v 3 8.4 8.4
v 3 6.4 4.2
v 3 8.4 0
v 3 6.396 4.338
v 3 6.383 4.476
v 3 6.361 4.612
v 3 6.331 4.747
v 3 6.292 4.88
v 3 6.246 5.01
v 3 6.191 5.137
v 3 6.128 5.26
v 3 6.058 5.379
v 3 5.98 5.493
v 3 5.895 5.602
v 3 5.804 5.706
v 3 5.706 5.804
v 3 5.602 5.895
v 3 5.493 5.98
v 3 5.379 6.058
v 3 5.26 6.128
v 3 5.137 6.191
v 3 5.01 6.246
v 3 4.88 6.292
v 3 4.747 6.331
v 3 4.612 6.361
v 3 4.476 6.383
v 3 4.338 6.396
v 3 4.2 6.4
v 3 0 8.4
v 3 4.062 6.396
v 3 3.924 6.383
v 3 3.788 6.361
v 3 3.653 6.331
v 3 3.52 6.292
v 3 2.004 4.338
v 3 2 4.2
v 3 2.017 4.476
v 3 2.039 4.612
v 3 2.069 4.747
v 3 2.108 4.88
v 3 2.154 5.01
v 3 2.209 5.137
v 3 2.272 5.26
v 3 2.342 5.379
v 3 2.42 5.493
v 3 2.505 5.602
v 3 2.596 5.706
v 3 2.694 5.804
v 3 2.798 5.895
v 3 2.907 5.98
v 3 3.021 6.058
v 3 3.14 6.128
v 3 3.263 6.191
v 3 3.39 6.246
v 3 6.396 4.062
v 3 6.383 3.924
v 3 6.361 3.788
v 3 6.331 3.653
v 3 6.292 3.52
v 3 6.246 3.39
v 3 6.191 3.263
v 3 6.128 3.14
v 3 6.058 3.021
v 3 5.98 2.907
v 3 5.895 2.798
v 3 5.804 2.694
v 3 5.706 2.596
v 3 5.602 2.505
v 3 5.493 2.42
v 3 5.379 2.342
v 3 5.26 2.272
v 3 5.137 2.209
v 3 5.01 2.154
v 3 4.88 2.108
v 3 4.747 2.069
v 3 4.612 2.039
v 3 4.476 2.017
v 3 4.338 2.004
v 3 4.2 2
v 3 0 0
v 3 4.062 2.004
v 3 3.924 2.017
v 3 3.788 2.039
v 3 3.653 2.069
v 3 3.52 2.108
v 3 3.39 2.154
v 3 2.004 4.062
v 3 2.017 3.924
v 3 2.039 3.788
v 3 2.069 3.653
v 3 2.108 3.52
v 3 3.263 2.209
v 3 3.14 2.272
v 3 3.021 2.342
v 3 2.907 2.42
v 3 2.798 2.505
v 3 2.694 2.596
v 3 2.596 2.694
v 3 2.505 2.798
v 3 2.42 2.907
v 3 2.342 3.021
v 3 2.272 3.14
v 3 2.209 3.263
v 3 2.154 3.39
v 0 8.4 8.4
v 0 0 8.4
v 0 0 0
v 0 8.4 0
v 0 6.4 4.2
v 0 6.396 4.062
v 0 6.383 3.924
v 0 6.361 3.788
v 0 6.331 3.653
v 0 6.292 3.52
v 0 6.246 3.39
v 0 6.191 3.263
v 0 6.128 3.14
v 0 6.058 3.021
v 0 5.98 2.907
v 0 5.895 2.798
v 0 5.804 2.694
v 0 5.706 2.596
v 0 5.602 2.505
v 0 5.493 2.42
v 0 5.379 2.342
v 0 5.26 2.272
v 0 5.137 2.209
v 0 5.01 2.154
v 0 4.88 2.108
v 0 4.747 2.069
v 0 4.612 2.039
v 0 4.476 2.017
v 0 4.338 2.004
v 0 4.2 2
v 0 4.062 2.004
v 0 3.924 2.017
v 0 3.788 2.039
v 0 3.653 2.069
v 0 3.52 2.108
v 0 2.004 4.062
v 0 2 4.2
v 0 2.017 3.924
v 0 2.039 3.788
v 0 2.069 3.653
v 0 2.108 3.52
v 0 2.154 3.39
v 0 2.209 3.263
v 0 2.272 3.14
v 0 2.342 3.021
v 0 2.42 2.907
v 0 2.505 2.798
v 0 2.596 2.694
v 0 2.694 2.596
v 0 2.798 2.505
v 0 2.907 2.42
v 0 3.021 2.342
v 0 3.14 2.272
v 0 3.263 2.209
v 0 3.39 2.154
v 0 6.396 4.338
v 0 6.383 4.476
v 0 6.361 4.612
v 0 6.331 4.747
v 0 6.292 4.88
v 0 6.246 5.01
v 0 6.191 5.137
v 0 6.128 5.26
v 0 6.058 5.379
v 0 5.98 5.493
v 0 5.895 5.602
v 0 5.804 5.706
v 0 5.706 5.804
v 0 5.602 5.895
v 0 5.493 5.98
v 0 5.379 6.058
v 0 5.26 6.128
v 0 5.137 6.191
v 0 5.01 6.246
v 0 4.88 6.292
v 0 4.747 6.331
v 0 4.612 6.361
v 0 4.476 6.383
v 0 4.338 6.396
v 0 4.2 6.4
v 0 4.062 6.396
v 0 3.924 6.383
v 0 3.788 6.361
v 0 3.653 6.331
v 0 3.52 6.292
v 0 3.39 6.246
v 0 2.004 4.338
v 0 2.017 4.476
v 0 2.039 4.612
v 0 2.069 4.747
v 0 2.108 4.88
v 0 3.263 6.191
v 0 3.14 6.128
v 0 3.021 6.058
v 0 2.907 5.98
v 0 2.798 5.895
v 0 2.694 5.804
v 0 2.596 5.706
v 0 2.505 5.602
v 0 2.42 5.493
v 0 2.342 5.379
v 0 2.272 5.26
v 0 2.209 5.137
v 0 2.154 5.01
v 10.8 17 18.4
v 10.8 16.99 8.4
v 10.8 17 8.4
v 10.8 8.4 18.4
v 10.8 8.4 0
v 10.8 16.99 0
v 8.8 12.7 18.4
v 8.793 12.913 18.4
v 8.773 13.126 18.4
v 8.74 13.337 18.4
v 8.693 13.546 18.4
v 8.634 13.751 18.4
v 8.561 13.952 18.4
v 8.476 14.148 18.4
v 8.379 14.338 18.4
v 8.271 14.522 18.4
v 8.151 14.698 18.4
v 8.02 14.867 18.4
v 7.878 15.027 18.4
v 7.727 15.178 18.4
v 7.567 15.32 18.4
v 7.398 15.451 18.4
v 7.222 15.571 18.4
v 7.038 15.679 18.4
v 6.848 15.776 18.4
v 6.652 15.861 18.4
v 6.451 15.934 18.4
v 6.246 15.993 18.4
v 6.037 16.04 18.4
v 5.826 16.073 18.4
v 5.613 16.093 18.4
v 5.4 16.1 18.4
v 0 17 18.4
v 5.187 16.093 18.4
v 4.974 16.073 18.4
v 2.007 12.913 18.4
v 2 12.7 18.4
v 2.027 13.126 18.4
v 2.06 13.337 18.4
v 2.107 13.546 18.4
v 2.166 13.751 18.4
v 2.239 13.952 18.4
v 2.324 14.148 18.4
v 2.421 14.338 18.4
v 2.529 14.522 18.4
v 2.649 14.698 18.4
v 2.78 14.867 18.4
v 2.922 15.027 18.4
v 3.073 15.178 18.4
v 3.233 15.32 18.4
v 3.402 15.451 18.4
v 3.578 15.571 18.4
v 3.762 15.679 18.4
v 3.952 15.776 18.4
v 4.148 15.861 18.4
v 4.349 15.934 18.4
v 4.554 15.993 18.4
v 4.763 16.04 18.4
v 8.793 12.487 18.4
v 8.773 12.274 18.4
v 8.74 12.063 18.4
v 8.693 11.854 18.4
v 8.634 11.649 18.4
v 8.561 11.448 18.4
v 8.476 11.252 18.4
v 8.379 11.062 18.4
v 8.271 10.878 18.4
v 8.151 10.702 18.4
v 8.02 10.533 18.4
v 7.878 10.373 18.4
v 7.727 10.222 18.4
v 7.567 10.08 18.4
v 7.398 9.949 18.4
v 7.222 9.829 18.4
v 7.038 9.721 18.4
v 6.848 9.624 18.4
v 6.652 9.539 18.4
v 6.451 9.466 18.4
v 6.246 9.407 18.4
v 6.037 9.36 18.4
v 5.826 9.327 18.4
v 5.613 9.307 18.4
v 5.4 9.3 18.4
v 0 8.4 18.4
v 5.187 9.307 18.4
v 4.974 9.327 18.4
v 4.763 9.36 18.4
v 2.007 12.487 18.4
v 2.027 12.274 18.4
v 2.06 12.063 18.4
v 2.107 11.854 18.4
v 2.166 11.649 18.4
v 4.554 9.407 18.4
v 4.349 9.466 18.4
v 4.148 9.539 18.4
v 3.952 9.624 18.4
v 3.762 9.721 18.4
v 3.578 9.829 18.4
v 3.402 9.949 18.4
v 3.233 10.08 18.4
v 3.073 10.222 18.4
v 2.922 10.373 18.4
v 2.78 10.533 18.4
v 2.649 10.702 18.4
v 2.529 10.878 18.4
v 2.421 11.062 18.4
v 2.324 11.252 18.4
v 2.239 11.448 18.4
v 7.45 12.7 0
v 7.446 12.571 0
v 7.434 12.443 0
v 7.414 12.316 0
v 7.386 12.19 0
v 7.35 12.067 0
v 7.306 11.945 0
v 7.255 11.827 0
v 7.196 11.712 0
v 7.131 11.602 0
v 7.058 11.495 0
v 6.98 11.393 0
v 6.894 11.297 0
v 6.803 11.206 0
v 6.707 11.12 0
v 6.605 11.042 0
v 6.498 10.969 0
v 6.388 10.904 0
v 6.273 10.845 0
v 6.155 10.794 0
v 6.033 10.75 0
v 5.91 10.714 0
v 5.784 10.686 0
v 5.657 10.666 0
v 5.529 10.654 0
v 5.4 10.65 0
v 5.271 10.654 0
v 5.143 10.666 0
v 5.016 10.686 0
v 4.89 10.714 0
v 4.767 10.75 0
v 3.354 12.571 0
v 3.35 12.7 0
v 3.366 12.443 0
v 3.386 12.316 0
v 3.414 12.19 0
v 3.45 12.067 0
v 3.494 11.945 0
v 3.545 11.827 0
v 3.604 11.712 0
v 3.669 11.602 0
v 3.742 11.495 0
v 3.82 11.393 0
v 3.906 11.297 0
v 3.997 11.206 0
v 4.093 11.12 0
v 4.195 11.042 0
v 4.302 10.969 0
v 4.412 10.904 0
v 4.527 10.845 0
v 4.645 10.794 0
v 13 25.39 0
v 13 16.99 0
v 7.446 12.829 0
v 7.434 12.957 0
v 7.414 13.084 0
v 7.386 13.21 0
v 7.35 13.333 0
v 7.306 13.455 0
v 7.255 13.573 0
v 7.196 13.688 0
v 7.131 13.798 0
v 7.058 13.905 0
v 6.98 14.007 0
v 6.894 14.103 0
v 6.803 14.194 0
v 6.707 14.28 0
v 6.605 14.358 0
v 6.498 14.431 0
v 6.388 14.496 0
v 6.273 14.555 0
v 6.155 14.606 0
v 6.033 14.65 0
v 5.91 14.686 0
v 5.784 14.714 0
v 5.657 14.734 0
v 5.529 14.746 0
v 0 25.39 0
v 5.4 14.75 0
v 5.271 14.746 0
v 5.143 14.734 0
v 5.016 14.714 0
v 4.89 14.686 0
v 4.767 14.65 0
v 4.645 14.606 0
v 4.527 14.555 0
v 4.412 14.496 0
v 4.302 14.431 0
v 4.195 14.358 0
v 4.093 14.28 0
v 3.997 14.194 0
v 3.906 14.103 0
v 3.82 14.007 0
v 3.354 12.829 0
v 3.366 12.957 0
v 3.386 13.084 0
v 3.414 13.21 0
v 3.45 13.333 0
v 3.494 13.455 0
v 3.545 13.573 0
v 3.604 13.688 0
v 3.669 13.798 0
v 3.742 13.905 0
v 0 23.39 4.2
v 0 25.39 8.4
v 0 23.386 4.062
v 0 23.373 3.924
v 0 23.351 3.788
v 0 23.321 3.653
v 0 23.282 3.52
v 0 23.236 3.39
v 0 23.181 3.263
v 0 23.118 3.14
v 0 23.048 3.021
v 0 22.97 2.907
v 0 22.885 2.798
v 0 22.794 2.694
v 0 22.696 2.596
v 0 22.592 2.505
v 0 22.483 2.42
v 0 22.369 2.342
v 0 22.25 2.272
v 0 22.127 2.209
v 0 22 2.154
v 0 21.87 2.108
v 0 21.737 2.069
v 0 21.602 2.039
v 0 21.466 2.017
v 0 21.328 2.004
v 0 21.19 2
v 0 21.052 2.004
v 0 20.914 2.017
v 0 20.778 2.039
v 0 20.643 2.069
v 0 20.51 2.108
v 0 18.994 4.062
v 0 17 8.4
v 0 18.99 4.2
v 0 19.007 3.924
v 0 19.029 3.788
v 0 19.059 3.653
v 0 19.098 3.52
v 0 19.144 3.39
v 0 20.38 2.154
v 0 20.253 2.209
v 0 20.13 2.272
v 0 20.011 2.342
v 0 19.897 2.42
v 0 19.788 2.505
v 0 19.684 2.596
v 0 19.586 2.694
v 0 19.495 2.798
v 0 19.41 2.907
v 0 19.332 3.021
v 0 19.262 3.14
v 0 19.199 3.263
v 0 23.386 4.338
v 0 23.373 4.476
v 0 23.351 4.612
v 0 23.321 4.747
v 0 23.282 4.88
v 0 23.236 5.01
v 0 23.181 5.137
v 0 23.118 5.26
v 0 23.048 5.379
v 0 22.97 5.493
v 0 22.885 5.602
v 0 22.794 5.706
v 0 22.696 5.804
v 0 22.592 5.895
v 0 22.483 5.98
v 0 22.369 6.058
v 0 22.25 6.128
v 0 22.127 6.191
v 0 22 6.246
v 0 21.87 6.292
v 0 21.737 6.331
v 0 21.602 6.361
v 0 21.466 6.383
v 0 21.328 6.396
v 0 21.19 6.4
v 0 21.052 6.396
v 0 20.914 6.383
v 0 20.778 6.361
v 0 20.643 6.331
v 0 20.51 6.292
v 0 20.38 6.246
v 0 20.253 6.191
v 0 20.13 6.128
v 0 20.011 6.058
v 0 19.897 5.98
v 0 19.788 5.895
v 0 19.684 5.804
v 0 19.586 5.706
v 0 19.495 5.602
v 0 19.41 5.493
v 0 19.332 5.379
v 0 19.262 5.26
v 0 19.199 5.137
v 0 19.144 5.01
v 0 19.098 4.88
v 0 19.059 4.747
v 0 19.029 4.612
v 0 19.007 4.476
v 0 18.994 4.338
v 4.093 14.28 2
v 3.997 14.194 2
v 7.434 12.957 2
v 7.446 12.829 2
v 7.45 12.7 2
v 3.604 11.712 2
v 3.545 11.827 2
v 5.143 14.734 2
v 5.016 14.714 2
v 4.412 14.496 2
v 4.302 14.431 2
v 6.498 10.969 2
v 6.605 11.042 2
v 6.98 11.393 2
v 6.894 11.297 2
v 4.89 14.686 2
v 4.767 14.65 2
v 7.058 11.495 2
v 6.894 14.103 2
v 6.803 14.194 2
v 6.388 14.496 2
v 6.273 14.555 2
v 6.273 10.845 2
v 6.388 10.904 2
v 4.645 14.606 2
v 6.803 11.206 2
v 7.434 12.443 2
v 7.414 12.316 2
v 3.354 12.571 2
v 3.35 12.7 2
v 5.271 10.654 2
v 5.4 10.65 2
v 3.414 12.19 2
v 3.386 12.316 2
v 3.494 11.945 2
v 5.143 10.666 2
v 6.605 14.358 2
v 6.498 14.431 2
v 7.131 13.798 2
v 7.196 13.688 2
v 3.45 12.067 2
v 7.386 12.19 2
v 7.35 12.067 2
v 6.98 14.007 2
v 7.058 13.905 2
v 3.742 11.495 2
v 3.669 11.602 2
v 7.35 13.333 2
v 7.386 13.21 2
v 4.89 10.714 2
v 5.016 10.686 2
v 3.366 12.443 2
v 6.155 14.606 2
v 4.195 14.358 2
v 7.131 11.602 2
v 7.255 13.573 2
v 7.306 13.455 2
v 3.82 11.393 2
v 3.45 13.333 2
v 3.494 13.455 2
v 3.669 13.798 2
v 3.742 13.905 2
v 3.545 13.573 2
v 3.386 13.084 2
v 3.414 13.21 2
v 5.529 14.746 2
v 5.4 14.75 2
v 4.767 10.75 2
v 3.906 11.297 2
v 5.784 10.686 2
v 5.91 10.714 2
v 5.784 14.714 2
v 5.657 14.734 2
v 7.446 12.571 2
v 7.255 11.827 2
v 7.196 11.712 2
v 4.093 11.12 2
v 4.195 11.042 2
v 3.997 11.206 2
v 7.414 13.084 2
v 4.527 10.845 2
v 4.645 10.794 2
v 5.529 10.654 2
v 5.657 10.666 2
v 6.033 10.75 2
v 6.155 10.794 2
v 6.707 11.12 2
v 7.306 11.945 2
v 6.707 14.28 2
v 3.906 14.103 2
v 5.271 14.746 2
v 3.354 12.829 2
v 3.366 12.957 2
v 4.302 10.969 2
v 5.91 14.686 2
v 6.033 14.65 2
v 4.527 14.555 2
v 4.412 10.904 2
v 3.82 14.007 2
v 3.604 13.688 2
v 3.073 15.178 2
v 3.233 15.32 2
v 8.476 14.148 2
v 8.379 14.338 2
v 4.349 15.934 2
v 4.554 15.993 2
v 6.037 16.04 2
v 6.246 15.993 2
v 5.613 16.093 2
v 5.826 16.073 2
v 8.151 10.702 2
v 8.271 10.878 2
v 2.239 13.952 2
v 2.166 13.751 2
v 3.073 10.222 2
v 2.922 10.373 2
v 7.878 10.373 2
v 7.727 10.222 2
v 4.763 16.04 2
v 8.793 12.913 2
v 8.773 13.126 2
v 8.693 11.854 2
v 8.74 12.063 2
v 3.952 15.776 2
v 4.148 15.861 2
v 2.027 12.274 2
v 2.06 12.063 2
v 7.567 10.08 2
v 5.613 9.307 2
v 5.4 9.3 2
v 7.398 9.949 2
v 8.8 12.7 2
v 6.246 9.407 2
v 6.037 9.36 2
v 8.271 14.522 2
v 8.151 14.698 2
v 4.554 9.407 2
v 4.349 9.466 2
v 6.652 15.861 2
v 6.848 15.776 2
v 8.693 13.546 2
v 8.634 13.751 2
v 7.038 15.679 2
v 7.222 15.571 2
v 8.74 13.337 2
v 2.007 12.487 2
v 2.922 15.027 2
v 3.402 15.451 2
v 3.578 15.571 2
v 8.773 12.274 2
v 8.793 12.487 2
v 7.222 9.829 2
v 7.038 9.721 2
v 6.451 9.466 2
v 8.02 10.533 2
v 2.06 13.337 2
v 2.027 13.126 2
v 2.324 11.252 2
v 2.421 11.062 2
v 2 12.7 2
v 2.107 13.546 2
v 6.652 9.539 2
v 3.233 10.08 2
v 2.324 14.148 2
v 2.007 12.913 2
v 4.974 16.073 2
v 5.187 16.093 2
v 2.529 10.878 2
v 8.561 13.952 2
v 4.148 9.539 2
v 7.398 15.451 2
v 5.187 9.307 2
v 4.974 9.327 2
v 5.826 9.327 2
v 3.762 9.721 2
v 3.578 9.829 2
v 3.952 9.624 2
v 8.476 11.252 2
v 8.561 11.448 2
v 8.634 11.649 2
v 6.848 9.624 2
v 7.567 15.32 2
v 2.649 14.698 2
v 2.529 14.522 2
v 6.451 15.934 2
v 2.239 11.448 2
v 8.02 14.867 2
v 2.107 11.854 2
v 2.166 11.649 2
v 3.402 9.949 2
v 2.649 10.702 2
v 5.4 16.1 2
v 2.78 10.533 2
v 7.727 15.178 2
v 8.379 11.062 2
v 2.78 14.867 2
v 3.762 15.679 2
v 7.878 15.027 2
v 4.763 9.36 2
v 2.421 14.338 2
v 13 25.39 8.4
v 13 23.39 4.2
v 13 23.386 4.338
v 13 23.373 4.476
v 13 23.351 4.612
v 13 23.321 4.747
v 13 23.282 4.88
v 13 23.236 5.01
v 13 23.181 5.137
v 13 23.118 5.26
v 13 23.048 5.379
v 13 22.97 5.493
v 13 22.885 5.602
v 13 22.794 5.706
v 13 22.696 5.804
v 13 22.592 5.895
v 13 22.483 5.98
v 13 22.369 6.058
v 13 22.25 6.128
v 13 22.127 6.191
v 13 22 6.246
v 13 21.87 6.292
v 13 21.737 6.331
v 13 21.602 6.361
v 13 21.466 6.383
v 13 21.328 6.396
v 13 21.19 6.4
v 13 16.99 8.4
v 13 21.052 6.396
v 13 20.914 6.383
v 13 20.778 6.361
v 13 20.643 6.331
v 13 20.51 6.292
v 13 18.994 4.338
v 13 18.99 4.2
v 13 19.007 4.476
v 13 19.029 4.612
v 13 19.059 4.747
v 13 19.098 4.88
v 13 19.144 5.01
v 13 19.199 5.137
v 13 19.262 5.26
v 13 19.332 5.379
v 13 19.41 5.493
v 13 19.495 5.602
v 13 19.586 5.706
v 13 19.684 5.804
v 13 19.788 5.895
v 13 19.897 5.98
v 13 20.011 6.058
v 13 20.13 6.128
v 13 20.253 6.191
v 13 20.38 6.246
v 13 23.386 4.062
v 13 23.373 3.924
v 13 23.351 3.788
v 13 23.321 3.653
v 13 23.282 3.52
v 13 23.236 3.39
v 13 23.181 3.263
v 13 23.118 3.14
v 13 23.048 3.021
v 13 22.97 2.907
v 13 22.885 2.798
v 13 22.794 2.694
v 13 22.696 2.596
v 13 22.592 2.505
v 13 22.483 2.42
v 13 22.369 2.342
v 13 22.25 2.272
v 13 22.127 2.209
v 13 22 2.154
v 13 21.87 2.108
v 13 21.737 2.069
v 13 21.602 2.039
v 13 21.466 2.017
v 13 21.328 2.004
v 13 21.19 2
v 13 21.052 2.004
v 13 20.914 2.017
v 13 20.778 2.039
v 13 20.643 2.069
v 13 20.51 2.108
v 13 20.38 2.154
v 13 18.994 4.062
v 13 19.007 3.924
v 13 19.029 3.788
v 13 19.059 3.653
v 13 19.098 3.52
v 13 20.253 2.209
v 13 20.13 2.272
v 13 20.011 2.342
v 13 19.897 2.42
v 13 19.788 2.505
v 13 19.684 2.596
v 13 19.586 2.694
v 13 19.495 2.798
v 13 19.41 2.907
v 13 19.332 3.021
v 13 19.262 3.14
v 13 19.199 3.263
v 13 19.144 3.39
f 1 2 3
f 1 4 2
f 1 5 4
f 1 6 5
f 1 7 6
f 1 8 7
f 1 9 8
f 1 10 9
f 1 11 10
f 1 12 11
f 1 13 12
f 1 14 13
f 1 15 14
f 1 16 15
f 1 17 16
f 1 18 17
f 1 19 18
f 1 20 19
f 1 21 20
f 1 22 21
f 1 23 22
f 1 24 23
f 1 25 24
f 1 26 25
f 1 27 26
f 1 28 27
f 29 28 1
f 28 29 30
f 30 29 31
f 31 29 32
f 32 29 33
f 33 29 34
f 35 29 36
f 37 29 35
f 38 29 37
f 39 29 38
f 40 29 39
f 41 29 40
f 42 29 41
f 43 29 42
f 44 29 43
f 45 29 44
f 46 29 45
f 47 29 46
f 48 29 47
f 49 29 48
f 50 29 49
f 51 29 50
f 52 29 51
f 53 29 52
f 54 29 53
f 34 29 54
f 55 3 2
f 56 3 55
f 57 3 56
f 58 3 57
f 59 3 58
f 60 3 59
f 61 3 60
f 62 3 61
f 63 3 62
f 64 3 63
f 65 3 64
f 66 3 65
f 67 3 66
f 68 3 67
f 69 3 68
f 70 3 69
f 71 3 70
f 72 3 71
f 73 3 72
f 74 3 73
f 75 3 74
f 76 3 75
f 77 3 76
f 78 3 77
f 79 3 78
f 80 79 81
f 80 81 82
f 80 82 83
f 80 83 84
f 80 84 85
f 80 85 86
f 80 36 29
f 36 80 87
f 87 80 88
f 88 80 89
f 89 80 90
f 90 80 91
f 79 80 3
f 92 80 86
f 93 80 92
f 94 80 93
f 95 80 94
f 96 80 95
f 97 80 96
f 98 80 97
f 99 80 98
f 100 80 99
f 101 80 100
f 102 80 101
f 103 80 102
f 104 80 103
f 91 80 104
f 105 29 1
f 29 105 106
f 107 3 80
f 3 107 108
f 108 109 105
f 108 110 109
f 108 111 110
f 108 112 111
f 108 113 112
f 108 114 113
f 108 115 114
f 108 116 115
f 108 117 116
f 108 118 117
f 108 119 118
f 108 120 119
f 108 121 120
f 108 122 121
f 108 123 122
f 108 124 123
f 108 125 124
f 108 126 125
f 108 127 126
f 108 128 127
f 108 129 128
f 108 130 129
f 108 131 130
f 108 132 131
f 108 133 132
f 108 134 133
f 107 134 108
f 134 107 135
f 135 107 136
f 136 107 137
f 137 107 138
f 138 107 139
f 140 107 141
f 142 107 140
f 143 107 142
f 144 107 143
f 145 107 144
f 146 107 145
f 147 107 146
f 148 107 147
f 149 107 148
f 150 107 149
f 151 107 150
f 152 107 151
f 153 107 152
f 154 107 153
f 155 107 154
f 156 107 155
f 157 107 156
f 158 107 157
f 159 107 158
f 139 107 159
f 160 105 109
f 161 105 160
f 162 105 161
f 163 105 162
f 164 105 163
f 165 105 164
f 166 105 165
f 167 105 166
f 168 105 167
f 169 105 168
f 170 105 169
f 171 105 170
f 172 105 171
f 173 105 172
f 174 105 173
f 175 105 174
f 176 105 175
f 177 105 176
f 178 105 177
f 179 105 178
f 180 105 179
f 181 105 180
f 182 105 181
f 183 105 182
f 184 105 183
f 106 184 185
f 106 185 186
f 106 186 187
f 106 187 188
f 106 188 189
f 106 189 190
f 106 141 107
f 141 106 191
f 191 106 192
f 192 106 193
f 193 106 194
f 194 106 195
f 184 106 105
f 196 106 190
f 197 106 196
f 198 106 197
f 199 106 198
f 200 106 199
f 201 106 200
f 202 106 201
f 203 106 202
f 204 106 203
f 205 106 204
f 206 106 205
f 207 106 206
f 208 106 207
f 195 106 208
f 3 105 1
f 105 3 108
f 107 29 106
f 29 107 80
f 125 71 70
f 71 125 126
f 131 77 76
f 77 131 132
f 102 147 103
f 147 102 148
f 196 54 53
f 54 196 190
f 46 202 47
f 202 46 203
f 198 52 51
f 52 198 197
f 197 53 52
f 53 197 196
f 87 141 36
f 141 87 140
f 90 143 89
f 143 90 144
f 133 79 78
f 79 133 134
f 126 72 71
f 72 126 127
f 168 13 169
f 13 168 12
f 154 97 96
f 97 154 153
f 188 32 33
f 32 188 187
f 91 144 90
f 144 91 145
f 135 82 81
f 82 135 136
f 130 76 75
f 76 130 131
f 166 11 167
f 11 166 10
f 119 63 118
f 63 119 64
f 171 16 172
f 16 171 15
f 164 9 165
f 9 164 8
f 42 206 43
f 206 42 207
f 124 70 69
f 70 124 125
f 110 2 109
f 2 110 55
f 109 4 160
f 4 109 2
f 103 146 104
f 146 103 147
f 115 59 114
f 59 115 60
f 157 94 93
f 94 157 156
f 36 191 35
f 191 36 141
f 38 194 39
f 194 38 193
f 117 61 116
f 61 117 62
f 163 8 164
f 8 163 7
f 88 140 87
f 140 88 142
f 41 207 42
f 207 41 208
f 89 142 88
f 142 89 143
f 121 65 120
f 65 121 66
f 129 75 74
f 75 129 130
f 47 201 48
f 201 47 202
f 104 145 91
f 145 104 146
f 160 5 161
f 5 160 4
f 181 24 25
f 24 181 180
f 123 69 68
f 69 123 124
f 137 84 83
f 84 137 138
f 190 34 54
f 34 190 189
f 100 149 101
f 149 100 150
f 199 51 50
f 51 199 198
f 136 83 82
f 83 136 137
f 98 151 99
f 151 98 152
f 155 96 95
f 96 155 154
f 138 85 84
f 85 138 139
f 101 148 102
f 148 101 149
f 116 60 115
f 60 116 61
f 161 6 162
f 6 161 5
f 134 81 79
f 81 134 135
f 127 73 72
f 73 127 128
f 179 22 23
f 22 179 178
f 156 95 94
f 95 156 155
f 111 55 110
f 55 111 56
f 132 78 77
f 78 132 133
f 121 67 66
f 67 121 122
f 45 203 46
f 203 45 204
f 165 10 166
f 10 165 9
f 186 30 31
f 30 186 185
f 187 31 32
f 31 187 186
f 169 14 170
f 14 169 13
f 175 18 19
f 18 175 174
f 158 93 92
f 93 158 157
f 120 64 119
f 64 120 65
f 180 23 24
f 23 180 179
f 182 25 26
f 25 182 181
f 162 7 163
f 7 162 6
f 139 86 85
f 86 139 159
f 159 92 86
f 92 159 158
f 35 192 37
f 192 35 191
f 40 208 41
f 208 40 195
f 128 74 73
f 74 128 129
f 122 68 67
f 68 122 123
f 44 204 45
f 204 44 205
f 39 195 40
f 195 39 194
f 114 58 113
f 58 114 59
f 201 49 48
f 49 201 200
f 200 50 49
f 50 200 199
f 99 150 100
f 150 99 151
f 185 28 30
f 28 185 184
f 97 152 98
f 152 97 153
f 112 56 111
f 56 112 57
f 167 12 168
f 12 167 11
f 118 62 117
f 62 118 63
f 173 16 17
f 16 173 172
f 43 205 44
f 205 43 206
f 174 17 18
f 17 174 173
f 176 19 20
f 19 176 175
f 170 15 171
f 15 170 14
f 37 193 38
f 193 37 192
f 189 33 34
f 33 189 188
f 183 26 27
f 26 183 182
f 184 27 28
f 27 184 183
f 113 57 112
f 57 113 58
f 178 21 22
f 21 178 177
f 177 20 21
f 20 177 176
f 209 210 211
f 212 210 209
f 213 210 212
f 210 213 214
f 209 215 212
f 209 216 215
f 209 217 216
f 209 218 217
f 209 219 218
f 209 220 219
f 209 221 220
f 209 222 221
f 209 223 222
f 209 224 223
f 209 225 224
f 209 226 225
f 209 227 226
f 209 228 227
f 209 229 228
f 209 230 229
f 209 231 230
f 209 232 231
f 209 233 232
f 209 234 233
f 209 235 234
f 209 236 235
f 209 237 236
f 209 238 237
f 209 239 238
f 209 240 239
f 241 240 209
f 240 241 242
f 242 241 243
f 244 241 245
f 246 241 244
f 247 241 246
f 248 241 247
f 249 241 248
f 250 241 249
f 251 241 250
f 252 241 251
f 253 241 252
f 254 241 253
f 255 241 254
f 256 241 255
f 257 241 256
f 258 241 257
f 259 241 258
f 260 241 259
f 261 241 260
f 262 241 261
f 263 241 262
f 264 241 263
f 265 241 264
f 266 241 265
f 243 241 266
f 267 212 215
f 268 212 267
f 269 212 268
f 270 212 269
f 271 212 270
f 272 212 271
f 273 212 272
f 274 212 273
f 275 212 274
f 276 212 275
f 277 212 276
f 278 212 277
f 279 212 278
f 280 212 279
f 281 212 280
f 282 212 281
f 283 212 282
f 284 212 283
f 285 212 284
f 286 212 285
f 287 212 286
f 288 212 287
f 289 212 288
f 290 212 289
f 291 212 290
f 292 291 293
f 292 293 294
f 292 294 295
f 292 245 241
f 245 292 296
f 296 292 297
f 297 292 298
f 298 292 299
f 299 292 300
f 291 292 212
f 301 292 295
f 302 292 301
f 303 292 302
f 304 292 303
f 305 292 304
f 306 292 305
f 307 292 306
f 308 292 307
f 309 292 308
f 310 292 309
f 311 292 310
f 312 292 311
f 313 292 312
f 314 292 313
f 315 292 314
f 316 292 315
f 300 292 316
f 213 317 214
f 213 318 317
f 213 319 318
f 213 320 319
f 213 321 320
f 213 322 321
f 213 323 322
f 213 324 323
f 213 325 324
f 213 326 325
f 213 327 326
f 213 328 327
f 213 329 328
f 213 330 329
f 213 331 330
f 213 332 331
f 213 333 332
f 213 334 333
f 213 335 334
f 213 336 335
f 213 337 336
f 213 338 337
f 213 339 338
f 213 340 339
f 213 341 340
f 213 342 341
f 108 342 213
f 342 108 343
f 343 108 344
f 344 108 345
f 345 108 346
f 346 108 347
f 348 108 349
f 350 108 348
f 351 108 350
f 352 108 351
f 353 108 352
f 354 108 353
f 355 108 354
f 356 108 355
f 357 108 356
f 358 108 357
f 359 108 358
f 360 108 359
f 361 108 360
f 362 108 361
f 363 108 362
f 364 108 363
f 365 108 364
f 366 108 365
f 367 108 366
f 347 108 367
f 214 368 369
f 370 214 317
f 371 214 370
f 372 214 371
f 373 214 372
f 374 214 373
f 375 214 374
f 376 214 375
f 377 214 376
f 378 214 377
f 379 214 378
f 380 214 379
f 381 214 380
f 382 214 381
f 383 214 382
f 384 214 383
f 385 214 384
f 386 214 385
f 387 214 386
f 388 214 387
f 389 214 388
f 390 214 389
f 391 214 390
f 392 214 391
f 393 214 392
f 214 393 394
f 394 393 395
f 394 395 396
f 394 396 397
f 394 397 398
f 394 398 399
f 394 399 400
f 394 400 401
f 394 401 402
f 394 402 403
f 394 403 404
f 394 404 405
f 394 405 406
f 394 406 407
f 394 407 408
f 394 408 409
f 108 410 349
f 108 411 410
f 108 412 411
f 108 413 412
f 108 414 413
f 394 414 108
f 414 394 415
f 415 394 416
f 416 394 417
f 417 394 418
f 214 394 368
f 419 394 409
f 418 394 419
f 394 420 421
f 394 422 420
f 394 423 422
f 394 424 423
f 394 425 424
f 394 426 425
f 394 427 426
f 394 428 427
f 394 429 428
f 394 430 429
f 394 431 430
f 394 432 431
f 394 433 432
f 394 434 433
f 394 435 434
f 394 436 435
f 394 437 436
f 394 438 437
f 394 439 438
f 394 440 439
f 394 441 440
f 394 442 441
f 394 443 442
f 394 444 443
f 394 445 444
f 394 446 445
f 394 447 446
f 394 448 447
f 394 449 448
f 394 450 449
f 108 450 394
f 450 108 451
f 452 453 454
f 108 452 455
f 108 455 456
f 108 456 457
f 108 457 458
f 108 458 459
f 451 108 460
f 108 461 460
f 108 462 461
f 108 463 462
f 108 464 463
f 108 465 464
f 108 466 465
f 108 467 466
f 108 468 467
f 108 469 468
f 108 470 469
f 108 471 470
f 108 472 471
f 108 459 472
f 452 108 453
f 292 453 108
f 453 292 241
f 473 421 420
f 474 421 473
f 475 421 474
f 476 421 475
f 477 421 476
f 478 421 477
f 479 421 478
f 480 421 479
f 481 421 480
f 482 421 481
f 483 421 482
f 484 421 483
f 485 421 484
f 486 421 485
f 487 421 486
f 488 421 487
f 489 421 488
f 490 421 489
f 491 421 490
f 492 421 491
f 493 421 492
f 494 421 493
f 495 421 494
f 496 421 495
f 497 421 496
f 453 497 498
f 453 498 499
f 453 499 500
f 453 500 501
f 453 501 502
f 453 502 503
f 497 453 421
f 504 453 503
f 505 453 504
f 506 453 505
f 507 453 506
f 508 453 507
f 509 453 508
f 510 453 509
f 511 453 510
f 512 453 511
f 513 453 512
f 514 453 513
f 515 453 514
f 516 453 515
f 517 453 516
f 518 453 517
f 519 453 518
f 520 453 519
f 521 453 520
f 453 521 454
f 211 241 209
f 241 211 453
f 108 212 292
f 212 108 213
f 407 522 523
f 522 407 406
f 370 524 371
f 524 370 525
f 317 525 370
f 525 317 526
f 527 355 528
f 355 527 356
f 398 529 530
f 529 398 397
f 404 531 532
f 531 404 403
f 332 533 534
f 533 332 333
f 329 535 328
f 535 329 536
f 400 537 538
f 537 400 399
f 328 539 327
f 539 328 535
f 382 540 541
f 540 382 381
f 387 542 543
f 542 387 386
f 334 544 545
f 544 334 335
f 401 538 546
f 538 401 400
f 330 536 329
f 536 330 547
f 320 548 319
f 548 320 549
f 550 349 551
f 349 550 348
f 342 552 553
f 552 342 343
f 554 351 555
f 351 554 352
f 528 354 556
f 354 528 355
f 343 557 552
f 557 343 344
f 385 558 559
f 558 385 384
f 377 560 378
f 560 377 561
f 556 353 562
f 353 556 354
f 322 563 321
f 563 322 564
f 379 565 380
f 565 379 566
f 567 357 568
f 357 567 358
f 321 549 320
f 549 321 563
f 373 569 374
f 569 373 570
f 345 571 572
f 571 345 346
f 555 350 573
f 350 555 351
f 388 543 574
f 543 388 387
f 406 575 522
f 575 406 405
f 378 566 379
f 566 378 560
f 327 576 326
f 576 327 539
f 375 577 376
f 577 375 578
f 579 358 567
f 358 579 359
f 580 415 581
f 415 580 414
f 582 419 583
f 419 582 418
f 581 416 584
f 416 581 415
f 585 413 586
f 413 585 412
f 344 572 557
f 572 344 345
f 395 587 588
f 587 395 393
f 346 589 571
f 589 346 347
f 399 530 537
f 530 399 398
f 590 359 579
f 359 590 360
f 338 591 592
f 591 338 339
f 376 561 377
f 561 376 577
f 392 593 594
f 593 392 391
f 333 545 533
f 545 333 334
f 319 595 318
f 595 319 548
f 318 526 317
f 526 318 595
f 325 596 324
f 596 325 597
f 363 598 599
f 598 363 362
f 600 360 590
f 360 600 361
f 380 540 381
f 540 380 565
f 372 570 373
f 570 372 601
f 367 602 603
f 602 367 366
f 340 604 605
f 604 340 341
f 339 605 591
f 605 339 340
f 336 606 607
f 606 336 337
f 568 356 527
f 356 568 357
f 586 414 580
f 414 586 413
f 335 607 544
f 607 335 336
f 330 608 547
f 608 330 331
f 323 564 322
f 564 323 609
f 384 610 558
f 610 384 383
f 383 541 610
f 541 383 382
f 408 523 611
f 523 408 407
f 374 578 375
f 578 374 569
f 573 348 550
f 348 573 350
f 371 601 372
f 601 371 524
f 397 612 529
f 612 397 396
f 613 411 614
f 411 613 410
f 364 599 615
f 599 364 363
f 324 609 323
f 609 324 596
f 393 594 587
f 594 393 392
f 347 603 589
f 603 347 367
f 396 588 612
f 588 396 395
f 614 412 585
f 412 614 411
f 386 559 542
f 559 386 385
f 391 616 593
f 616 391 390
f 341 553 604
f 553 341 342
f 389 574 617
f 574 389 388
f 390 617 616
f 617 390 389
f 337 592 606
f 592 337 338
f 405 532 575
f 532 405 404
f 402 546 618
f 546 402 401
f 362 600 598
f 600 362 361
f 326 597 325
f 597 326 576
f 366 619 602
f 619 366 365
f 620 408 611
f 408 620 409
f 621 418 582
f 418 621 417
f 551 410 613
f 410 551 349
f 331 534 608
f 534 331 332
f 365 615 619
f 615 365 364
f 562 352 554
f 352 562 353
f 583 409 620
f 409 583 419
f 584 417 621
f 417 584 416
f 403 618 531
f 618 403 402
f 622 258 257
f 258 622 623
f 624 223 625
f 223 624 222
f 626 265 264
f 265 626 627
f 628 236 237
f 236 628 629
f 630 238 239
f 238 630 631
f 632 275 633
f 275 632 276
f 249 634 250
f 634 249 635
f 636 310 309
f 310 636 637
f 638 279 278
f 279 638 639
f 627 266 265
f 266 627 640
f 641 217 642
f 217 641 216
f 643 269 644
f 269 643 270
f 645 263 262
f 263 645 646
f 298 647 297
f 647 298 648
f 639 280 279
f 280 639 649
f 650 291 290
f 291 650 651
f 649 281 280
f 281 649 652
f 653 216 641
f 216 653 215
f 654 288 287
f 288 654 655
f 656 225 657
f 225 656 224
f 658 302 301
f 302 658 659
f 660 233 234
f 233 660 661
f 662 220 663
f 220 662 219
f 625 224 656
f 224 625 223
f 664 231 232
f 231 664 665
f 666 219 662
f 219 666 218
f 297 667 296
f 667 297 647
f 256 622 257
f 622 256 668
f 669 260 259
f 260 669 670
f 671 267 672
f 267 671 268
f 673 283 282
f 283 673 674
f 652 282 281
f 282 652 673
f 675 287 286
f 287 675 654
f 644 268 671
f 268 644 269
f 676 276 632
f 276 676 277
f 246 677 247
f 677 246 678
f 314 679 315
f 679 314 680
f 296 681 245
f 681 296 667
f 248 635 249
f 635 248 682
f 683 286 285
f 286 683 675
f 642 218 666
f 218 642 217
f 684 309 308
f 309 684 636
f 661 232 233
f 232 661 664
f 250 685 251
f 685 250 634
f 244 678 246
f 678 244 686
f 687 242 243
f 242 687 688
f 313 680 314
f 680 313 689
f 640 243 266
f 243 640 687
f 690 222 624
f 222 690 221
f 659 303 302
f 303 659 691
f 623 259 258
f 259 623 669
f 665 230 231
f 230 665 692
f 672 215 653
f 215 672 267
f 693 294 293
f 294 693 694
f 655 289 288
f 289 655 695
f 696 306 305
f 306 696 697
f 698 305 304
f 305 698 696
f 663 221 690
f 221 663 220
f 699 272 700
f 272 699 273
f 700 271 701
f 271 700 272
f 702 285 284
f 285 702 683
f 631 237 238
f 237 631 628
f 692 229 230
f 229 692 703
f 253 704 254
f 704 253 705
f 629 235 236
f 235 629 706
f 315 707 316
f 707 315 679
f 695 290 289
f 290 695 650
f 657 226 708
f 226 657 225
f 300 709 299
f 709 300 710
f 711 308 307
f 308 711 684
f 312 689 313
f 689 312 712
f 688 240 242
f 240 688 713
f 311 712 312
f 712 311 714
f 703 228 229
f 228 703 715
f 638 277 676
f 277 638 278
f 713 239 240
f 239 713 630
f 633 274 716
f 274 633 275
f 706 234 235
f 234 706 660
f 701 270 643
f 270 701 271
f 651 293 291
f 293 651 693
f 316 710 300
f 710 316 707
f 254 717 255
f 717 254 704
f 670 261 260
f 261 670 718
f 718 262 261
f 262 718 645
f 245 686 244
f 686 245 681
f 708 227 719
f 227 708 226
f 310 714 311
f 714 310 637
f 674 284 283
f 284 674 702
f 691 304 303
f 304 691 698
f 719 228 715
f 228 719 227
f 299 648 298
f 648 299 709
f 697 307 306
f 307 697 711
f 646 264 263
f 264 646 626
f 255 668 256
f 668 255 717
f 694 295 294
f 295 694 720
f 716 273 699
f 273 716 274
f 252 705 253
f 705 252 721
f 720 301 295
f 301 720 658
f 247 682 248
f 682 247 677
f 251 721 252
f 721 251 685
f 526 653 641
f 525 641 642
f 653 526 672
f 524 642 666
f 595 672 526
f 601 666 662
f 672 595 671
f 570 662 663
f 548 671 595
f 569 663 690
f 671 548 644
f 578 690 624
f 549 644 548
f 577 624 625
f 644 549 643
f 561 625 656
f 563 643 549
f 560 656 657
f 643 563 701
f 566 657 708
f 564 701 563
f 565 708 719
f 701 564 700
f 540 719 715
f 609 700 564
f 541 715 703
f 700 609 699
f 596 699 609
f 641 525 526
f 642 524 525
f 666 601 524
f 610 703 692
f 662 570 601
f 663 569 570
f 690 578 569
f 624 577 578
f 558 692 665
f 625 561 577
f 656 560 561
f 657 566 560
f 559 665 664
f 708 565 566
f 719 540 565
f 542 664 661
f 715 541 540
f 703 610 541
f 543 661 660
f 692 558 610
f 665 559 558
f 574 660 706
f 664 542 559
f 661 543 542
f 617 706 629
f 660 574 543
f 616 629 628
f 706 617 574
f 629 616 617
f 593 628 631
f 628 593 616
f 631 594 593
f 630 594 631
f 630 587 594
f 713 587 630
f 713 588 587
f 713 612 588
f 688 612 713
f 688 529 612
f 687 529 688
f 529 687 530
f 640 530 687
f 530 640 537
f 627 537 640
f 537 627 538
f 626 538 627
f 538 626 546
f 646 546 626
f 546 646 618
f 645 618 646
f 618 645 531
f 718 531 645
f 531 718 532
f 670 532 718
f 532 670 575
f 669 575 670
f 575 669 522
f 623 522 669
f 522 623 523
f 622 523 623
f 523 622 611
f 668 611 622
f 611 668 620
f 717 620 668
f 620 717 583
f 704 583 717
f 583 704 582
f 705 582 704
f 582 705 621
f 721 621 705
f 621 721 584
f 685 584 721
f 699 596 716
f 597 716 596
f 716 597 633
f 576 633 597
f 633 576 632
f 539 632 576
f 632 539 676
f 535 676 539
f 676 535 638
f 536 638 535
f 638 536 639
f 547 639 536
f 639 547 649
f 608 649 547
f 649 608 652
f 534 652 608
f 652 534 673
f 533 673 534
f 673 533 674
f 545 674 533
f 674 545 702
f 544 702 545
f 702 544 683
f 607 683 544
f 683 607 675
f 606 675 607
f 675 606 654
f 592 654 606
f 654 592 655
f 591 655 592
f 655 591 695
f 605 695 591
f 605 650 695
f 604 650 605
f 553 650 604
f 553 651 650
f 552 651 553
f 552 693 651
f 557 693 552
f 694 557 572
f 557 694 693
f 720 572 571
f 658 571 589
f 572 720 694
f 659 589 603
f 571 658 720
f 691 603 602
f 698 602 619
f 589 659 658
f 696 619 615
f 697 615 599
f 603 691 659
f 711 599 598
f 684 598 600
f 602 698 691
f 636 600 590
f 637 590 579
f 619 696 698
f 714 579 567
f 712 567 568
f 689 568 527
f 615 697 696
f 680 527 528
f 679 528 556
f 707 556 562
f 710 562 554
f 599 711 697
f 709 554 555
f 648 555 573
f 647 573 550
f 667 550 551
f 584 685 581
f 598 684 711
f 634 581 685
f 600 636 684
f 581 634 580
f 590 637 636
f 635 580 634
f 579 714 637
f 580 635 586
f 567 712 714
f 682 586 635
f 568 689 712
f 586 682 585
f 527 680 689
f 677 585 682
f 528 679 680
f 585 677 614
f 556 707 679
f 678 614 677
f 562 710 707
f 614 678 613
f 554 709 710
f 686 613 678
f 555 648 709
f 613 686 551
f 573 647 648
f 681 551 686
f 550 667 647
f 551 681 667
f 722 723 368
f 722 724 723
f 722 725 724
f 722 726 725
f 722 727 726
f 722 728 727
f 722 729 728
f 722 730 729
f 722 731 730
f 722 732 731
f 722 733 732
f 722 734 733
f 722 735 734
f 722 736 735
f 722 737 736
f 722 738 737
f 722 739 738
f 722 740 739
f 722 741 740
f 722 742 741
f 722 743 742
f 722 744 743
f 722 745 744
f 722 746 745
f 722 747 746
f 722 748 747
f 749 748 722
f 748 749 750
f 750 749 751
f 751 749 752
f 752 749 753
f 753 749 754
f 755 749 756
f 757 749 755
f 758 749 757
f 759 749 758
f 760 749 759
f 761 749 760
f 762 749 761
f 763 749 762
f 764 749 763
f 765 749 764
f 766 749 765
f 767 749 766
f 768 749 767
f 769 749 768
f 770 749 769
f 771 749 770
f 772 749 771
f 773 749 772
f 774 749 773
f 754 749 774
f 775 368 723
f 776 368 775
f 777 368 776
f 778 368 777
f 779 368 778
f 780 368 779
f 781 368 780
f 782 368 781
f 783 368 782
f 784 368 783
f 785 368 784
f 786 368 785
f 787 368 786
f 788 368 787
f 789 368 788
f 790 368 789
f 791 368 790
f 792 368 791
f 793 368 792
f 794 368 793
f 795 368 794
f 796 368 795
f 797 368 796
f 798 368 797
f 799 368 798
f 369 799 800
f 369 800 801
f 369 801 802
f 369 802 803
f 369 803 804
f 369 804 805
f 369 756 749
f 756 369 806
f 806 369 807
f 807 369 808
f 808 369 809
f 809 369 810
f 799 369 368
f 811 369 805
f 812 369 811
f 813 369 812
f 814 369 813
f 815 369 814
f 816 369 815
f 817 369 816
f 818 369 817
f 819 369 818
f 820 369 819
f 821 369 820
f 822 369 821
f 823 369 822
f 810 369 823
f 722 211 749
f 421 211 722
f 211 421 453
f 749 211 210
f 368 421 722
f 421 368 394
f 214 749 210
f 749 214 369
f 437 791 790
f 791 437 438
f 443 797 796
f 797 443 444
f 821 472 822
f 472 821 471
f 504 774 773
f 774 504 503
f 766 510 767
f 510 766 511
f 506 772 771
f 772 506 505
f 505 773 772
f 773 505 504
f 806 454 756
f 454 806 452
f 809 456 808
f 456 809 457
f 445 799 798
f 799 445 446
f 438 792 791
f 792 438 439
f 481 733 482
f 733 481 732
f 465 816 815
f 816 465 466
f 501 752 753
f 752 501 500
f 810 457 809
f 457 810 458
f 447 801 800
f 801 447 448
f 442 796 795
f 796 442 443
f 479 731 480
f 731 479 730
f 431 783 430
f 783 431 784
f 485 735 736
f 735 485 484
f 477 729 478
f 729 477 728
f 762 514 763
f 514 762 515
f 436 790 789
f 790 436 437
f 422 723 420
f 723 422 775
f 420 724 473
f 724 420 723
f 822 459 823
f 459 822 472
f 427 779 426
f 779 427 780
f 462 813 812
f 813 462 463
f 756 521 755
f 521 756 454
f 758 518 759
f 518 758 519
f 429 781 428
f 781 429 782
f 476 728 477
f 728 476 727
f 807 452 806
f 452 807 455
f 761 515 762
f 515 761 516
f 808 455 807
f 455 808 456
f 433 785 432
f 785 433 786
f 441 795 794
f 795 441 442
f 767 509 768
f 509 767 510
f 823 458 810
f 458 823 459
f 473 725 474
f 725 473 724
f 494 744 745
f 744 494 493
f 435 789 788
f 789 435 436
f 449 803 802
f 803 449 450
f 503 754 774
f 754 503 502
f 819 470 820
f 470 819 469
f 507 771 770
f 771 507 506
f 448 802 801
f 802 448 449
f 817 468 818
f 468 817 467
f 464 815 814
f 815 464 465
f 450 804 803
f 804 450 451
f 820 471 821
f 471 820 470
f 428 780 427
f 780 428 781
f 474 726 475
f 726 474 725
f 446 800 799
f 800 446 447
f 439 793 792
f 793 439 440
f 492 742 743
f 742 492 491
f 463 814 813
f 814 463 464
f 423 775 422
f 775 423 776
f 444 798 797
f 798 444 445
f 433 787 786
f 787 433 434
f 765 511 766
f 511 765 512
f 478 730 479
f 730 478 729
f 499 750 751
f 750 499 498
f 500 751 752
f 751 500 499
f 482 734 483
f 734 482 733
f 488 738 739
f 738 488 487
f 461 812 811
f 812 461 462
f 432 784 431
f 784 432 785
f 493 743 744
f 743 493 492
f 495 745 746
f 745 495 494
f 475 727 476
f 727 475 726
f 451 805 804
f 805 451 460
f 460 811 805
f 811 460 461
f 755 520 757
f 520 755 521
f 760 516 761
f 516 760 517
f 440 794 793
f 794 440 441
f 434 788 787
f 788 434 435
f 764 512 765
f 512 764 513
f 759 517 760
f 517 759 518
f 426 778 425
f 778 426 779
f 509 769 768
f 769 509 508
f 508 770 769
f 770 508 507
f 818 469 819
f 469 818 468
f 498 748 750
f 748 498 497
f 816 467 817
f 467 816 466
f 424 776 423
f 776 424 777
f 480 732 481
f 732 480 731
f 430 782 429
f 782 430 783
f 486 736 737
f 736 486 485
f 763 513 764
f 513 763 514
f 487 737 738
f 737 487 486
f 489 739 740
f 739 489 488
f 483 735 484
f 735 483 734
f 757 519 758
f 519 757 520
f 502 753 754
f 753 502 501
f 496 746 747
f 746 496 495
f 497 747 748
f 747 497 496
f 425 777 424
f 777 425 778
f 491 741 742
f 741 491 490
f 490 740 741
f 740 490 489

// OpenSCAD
/*
 * file: reprap-mgs-extruder-filament-conduct.scad
 * author: gregor binder <gregor_reprap@catrix.at>
 * date: 26.12.2013
 * last change: 26.12.2013
 * license: CC BY-NC-SA 4.0
 */

diameter_screw=4.4;
diameter_filament_top=6.8;
diameter_filament_bottom=4.1;
top_height=10;
thickness=2;
screw_distance=17;
back_depth_1=3;
back_depth_2=13;
$fn=100;

/****************/

temp_bottom_height=diameter_screw+2*thickness;
temp_top_width=screw_distance-diameter_screw-2*thickness;
temp_top_width2=diameter_filament_top+2*thickness;
temp_top_height=temp_bottom_height+top_height;
temp_middle=(screw_distance+diameter_screw+2*thickness)/2;

module mountingpart(d) {
	difference() {
		cube([d,temp_bottom_height,temp_bottom_height]);
		translate([-0.1,temp_bottom_height/2,temp_bottom_height/2])
			rotate([0,90,0])
				cylinder(h=d+5,r=diameter_screw/2);
	}
}

module filamentpart() {
	difference() {
		cube([temp_top_width2,temp_top_width,temp_top_height]);
		translate([temp_top_width2/2,temp_top_width/2,-0.1])
			cylinder(h=temp_top_height+5,r=diameter_filament_bottom/2);
		translate([temp_top_width2/2,temp_top_width/2,thickness])
			cylinder(h=temp_top_height+5,r=diameter_filament_top/2);
	}
}

union() {
mountingpart(back_depth_1);
translate([0,temp_middle-(temp_top_width/2),0])
	filamentpart();
translate([0,screw_distance-0.01,0])
	mountingpart(back_depth_2);
}
